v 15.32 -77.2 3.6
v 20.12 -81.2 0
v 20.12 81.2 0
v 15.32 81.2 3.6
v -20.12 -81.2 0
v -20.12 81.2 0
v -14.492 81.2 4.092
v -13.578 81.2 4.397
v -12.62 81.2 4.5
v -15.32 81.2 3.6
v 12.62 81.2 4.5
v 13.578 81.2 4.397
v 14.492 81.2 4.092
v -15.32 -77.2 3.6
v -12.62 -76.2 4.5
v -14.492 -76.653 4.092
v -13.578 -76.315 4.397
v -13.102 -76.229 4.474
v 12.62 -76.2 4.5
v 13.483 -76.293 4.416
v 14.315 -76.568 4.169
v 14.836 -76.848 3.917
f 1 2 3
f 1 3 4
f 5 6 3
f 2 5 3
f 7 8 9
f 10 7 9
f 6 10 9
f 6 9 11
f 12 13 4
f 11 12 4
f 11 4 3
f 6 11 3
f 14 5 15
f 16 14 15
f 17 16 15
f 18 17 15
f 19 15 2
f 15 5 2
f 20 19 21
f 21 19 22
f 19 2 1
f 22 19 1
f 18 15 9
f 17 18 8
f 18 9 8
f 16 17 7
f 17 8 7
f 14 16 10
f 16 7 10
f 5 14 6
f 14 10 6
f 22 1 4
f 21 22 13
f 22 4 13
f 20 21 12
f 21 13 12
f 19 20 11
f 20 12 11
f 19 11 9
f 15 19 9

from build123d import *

# Parameters (mm, degrees)
F3_DEPTH = 157.4
F4_DEPTH = 5
F6_DEPTH = 100


with BuildPart() as f3:
    # F2 (on offset) → F3 (new body)
    with BuildSketch(Plane.XZ.offset(76.2)):
        with BuildLine():
            ThreePointArc((15.32, 3.6), (16.644922, 2.012461), (17.12, 0))
            Line((17.12, 0), (20.12, 0))
            Line((20.12, 0), (15.32, 3.6))
        make_face()
        with BuildLine():
            ThreePointArc((-17.12, 0), (-16.644922, 2.012461), (-15.32, 3.6))
            Line((-15.32, 3.6), (-20.12, 0))
            Line((-20.12, 0), (-17.12, 0))
        make_face()
        with BuildLine():
            ThreePointArc((-4.5, 0), (-3.181981, 3.181981), (0, 4.5))
            Line((0, 4.5), (-12.62, 4.5))
            ThreePointArc((-12.62, 4.5), (-9.438019, 3.181981), (-8.12, 0))
            Line((-8.12, 0), (-4.5, 0))
        make_face()
        with BuildLine():
            ThreePointArc((0, 4.5), (3.181981, 3.181981), (4.5, 0))
            Line((4.5, 0), (8.12, 0))
            ThreePointArc((8.12, 0), (9.438019, 3.181981), (12.62, 4.5))
            Line((12.62, 4.5), (0, 4.5))
        make_face()
        with BuildLine():
            ThreePointArc((15.32, 3.6), (14.043025, 4.269075), (12.62, 4.5))
            Line((12.62, 4.5), (12.62, 0))
            Line((12.62, 0), (15.32, 3.6))
        make_face()
        with BuildLine():
            Line((0, 0), (4.5, 0))
            ThreePointArc((4.5, 0), (3.181981, 3.181981), (0, 4.5))
            Line((0, 4.5), (0, 0))
        make_face()
        with BuildLine():
            Line((0, 0), (0, 4.5))
            ThreePointArc((0, 4.5), (-3.181981, 3.181981), (-4.5, 0))
            Line((-4.5, 0), (0, 0))
        make_face()
        with BuildLine():
            Line((12.62, 0), (17.12, 0))
            ThreePointArc((17.12, 0), (16.644922, 2.012461), (15.32, 3.6))
            Line((15.32, 3.6), (12.62, 0))
        make_face()
        with BuildLine():
            ThreePointArc((12.62, 4.5), (9.438019, 3.181981), (8.12, 0))
            Line((8.12, 0), (12.62, 0))
            Line((12.62, 0), (12.62, 4.5))
        make_face()
        with BuildLine():
            Line((-12.62, 0), (-12.62, 4.5))
            ThreePointArc((-12.62, 4.5), (-14.043025, 4.269075), (-15.32, 3.6))
            ThreePointArc((-15.32, 3.6), (-16.644922, 2.012461), (-17.12, 0))
            Line((-17.12, 0), (-12.62, 0))
        make_face()
        with BuildLine():
            ThreePointArc((-8.12, 0), (-9.438019, 3.181981), (-12.62, 4.5))
            Line((-12.62, 4.5), (-12.62, 0))
            Line((-12.62, 0), (-8.12, 0))
        make_face()
    extrude(amount=-F3_DEPTH)

    # F3_face (on face) → F4 (join)
    with BuildSketch(Plane(origin=(0, -76.2, 2.111862), x_dir=(1, 0, 0), z_dir=(0, -1, 0))):
        with BuildLine():
            ThreePointArc((15.32, 1.488138), (14.043025, 2.157213), (12.62, 2.388138))
            Line((12.62, 2.388138), (-12.62, 2.388138))
            ThreePointArc((-12.62, 2.388138), (-14.043025, 2.157213), (-15.32, 1.488138))
            Line((-15.32, 1.488138), (-20.12, -2.111862))
            Line((-20.12, -2.111862), (20.12, -2.111862))
            Line((20.12, -2.111862), (15.32, 1.488138))
        make_face()
    extrude(amount=F4_DEPTH)

    # F5 (on Right) → F6 (cut, symmetric)
    with BuildSketch(Plane.YZ):
        Polygon((-81.2, 4.5), (-81.2, 0), (-76.2, 4.5), align=None)
    extrude(amount=F6_DEPTH, both=True, mode=Mode.SUBTRACT)


solid = f3.part
